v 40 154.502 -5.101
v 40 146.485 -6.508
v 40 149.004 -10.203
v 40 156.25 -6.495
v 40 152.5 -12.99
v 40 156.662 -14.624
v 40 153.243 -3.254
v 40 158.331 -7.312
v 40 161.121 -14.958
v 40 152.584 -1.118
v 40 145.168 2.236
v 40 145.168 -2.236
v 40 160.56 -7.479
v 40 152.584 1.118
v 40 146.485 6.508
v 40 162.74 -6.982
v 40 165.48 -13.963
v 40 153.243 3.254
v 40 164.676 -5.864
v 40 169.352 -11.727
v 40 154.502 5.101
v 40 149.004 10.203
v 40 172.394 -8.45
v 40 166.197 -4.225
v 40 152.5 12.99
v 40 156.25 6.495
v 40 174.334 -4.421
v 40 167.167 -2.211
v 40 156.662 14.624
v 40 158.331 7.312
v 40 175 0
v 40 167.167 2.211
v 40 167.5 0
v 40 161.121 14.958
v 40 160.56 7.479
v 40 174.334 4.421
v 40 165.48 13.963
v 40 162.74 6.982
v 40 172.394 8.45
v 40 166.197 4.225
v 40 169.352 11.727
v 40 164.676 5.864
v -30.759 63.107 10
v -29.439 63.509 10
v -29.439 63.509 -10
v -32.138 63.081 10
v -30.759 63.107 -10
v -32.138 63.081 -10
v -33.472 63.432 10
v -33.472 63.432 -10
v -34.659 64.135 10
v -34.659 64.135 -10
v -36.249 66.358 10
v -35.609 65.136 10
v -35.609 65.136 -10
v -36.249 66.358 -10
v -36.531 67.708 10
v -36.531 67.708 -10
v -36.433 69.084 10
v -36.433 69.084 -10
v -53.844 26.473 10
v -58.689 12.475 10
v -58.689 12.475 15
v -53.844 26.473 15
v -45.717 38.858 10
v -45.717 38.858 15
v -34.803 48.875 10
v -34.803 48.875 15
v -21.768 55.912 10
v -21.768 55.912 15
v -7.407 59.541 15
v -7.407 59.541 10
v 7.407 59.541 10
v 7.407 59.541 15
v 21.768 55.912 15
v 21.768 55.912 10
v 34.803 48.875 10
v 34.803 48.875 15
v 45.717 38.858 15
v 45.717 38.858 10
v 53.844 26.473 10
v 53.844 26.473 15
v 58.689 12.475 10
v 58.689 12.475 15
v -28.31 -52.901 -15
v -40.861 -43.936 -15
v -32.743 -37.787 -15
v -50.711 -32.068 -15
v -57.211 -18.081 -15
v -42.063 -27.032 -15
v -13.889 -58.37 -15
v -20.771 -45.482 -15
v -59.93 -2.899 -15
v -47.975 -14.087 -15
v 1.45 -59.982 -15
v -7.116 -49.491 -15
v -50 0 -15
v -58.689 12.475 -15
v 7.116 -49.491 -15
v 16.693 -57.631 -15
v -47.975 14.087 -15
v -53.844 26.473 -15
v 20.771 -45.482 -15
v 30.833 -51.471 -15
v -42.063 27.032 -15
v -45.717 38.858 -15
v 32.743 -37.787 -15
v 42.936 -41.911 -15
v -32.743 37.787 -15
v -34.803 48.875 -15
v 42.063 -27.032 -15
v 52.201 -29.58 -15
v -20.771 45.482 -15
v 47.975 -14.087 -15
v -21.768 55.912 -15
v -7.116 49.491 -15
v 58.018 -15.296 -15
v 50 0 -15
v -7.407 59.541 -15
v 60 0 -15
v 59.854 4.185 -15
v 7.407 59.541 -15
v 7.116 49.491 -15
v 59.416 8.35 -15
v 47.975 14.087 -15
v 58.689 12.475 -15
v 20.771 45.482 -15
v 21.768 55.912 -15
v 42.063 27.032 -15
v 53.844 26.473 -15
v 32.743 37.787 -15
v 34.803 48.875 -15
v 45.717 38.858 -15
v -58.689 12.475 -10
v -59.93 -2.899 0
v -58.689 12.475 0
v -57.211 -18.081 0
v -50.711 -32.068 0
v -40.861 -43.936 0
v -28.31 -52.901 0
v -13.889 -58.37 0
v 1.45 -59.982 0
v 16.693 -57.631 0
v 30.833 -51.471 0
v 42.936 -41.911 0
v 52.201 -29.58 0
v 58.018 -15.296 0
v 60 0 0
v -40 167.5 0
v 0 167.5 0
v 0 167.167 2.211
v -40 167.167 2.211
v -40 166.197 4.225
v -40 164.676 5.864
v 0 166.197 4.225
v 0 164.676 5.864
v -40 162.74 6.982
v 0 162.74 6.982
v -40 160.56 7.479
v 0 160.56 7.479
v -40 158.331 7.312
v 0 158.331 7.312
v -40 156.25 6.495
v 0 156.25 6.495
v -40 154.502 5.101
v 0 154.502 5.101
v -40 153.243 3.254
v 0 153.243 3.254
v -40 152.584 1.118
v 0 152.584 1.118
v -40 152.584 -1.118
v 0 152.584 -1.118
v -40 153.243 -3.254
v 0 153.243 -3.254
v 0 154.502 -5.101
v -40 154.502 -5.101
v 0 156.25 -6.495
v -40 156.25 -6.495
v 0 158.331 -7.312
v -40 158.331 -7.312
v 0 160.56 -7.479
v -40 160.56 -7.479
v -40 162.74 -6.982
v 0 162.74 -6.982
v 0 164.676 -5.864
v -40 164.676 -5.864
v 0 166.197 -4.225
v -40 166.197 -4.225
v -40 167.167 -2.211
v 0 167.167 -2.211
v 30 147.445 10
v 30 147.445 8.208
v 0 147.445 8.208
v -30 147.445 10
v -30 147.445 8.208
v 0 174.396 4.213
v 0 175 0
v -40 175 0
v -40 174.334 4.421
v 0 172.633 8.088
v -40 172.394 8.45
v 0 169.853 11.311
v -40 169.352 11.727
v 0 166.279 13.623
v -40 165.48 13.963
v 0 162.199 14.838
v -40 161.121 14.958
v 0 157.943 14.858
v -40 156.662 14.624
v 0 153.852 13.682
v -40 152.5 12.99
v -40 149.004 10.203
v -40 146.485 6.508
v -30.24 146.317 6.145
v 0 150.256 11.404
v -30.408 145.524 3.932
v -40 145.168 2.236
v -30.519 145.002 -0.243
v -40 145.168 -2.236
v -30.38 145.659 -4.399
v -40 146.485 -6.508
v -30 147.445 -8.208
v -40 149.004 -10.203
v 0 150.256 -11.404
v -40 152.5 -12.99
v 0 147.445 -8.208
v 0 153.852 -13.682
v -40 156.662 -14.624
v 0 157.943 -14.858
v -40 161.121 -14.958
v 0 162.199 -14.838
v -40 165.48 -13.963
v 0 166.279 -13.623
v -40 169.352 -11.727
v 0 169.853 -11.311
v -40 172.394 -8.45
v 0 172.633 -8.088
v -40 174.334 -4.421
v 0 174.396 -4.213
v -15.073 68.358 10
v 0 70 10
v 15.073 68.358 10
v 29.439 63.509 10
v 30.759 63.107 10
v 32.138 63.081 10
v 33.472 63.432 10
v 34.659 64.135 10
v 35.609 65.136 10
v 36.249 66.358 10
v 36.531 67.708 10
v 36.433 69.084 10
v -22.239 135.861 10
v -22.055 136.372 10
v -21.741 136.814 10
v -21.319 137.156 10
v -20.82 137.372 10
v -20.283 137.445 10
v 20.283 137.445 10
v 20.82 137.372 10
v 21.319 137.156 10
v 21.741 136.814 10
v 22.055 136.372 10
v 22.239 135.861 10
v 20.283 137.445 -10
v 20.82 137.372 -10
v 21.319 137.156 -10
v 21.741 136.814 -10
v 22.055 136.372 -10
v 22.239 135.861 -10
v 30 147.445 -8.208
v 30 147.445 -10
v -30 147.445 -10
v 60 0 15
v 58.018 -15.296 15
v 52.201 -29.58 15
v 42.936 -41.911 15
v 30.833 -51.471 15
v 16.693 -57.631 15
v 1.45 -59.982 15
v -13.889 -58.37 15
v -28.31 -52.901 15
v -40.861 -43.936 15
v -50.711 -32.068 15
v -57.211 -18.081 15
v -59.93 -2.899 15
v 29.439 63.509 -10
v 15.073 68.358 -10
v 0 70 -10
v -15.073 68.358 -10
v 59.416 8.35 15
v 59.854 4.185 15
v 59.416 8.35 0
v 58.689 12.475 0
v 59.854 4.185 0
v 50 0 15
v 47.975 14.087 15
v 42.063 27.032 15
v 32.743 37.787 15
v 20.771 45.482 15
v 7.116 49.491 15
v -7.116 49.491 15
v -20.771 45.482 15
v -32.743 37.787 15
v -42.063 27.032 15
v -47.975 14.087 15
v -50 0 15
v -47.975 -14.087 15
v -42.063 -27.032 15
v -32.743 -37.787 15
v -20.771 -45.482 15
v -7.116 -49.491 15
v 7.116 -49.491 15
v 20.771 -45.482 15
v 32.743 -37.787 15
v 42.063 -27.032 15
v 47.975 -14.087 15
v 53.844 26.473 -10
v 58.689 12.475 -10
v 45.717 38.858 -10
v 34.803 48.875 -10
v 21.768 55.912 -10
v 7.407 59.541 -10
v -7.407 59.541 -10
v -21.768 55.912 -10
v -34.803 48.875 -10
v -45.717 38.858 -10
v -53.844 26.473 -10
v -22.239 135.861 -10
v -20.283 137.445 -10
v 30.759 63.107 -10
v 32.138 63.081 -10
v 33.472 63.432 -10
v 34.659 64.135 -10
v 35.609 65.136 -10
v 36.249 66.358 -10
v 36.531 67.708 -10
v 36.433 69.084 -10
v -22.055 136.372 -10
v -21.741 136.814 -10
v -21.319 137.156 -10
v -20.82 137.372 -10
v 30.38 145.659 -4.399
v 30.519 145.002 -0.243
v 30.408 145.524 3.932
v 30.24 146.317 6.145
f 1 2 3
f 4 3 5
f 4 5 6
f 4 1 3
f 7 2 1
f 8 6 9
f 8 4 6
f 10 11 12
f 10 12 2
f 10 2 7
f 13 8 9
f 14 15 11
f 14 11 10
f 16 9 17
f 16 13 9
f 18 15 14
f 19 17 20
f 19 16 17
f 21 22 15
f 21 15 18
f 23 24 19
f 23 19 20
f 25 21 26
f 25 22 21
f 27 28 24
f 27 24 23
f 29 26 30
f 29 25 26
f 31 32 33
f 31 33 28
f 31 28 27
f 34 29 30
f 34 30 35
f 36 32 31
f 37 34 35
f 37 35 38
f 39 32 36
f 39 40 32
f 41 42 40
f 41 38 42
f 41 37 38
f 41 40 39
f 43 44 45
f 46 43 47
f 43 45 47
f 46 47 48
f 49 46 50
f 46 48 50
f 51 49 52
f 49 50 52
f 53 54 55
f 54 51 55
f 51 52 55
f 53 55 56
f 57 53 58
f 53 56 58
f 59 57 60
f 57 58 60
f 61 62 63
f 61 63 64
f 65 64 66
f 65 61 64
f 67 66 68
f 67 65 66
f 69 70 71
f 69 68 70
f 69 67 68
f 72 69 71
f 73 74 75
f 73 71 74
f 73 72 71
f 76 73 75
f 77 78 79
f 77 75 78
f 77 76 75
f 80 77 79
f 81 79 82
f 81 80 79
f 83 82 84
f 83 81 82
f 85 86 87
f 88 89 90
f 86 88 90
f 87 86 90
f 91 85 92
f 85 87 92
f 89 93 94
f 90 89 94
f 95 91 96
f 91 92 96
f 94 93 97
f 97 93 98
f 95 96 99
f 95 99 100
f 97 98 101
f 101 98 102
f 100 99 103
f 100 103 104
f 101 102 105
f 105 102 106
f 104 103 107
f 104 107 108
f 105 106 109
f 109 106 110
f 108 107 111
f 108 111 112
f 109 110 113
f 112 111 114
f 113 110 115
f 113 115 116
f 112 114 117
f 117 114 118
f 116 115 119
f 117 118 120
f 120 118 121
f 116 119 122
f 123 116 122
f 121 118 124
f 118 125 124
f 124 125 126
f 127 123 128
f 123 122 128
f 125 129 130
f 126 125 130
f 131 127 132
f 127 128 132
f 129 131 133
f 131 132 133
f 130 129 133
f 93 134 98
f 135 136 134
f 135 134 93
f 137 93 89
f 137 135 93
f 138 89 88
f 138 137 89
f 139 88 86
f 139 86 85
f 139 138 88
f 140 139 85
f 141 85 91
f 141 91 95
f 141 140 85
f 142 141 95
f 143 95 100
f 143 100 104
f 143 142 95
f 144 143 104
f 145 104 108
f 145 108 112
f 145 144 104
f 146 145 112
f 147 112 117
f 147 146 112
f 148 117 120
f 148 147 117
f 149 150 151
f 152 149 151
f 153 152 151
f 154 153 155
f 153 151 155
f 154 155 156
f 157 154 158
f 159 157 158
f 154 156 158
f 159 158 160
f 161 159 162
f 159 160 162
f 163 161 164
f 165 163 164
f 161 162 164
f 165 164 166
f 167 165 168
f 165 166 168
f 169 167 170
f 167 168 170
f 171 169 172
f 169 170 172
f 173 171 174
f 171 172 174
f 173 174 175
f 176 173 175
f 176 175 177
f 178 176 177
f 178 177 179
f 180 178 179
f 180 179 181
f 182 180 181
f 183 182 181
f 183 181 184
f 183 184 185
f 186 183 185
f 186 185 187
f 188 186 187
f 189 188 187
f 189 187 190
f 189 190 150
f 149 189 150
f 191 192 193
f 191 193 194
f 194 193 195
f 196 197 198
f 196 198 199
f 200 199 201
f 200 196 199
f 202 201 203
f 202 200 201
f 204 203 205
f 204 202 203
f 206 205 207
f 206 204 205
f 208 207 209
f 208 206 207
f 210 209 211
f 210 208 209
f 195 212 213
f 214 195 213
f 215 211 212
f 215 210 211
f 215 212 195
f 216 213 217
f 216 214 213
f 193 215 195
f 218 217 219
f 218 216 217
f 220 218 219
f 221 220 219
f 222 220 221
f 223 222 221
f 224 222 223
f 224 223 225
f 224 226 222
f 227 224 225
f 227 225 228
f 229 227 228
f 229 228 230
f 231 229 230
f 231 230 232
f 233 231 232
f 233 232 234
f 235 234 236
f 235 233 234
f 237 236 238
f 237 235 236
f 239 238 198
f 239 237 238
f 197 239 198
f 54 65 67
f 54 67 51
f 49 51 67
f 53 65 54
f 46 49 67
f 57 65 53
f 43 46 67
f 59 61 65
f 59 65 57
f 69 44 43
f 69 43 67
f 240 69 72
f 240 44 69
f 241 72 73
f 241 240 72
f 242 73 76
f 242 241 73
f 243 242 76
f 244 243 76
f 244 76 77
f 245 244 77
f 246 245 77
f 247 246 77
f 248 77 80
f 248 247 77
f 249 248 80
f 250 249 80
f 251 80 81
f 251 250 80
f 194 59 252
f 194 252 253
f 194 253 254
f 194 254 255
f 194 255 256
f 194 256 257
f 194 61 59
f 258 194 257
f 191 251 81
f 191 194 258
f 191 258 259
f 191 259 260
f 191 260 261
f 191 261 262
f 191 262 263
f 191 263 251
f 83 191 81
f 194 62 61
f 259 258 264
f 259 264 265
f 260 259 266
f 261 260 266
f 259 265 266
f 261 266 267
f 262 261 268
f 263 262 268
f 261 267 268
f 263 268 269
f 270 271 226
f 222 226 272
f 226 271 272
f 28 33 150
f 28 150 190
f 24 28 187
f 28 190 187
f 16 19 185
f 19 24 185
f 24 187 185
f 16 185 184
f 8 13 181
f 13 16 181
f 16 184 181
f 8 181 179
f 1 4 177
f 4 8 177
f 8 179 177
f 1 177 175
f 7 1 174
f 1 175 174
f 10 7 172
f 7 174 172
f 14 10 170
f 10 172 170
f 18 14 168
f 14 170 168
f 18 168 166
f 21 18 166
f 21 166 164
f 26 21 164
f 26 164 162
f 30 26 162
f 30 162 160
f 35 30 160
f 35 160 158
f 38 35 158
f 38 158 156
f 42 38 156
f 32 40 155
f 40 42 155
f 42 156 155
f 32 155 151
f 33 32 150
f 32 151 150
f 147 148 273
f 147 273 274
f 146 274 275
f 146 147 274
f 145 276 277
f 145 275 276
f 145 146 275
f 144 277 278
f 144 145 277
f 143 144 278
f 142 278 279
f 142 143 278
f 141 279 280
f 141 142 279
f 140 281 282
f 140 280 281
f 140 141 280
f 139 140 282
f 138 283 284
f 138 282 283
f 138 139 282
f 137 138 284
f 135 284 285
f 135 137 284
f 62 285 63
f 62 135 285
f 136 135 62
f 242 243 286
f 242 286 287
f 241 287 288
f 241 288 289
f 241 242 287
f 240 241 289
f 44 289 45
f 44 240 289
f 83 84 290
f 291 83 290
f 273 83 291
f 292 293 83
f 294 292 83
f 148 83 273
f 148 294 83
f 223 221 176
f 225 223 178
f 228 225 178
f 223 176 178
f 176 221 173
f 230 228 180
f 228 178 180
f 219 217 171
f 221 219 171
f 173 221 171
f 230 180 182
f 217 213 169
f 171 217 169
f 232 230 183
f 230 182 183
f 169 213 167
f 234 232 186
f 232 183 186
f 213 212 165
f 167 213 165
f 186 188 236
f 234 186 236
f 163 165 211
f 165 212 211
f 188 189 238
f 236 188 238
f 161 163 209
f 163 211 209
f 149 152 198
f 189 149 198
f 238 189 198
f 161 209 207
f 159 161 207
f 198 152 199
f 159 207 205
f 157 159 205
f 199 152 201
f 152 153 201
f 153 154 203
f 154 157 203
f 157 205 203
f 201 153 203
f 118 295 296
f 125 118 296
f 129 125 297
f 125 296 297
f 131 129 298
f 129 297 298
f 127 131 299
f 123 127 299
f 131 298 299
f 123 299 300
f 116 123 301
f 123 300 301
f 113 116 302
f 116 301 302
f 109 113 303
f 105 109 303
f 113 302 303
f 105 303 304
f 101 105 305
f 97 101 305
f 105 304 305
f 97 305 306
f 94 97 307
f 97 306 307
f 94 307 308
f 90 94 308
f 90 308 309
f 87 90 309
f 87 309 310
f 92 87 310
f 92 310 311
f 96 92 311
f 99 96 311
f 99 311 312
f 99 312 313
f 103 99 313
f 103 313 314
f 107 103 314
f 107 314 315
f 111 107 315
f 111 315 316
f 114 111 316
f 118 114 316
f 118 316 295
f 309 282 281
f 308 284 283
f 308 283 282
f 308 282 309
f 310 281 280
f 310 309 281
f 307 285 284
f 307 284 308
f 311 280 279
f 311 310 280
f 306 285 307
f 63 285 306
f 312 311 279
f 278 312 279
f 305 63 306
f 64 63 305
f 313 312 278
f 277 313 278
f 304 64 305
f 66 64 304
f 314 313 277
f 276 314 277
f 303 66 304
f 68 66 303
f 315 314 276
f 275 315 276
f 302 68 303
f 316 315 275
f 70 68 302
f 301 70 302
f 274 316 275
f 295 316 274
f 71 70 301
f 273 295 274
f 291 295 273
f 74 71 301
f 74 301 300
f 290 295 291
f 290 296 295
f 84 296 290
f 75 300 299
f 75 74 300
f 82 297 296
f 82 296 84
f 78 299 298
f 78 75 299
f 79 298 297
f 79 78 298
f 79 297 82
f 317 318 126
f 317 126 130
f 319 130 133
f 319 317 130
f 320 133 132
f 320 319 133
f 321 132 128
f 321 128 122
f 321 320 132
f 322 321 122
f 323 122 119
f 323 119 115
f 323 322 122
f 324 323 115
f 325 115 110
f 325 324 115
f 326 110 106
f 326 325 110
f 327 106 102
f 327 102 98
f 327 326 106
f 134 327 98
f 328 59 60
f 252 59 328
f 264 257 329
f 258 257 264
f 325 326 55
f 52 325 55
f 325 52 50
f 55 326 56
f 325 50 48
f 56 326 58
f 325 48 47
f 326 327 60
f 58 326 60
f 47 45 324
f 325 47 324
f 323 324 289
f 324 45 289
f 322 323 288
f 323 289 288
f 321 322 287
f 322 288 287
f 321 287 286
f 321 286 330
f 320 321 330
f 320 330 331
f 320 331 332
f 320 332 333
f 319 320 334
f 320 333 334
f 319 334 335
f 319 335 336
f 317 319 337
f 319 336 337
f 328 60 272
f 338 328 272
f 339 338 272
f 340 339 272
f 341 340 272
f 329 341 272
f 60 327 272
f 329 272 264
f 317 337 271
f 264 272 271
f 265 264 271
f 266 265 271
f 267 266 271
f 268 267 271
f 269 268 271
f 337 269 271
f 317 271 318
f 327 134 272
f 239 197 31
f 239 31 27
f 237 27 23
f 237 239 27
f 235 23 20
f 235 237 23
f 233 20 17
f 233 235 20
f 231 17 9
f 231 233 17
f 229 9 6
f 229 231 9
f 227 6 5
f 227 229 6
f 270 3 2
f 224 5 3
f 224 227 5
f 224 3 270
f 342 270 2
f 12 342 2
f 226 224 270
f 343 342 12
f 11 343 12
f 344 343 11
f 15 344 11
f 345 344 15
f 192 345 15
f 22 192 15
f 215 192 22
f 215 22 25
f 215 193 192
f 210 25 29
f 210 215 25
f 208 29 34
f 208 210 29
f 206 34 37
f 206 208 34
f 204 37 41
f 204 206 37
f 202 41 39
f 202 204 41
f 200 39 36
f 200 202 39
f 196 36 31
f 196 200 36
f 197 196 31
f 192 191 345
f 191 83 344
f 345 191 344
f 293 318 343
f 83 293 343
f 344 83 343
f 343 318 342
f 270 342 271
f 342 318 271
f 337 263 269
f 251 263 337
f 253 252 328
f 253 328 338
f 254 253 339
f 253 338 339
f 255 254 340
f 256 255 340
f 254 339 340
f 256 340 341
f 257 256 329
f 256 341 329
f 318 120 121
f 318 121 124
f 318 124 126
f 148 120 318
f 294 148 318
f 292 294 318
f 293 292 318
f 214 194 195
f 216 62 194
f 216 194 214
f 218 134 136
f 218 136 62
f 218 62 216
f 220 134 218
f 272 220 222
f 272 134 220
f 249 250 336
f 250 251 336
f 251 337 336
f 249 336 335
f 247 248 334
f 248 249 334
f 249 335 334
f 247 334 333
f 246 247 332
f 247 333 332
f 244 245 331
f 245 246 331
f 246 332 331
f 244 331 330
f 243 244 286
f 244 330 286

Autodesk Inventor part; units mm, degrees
ref_plane "XZ Plane" through (0, 0, 0) normal (0, 1, 0) x (-1, 0, 0)
ref_plane "XY Plane" through (0, 0, 0) normal (0, 0, 1) x (1, 0, 0)
sketch "Skizze1" plane through (0, 0, 0) normal (0, 0, 1) x (1, 0, 0)
  circle A0 centre (0, 0) radius 60
  line L0 (-58.6889, 12.4747) -> (-30, 147.4452)
  line L1 (58.6889, 12.4747) -> (30, 147.4452)
  line L2 (30, 147.4452) -> (-30, 147.4452)
  line L3 (0, 0) -> (0, 147.4452) construction
  dimension "d0" = 120
  dimension "d1" = 24
  dimension "d2" = 60
extrude "Extrusion1" add sketch "Skizze1" along normal mid plane 30 contours A0
extrude "Extrusion2" add sketch "Skizze1" along normal mid plane 20 contours A0 L0 L2 L1
sketch "Skizze2" plane through (0, 0, 15) normal (0, 0, 1) x (1, 0, 0)
  circle A0 centre (0, 0) radius 50
  dimension "d7" = 100
extrude "Extrusion3" cut sketch "Skizze2" against normal up to surface (30 mm away)
ref_plane "Arbeitsebene1" through (0, 0, 0) normal (1, 0, 0) x (0, 1, 0)
sketch "Skizze3" plane through (0, 0, 0) normal (1, 0, 0) x (0, 1, 0)
  line L0 (147.4452, 10) -> (12.4747, 10) projected
  line L1 (12.4747, 10) -> (12.4747, 10) projected
  line L2 (12.4747, 10) -> (147.4452, 10) projected
  circle A0 centre (160, 0) radius 15
  circle A1 centre (160, 0) radius 7.5
  point P0 (0, 0)
  dimension "d11" = 30
  dimension "d12" = 160
  dimension "d13" = 15
extrude "Extrusion4" add sketch "Skizze3" along normal mid plane 80
sketch "Skizze4" plane through (0, 0, 10) normal (0, 0, 1) x (1, 0, 0)
  line L0 (-21.9022, 137.4452) -> (21.9022, 137.4452)
  line L1 (21.9022, 137.4452) -> (38.7218, 58.3148)
  line L2 (-38.7218, 58.3148) -> (-21.9022, 137.4452)
  line L3 (0, 0) -> (0, 147.2716) construction
  line L4 (-30, 147.4452) -> (-58.6889, 12.4747) projected
  line L5 (58.6889, 12.4747) -> (30, 147.4452) projected
  line L6 (30, 147.4452) -> (-30, 147.4452) projected
  arc A0 (38.7218, 58.3148) -> (-38.7218, 58.3148) centre (0, 0) ccw
  circle A1 centre (0, 0) radius 60 projected
  dimension "d16" = 10
  dimension "d17" = 10
  dimension "d18" = 70
extrude "Extrusion5" cut sketch "Skizze4" against normal up to surface (20 mm away) contours L0 L1 A0 L2
fillet "Rundung1" radius 5 2 edges at (-38.7218, 58.3148, 0) (38.7218, 58.3148, 0)
fillet "Rundung2" radius 2 2 edges at (21.9022, 137.4452, 0) (-21.9022, 137.4452, 0)
properties part number "Excercise4" material "Stahl, galvanisiert"
